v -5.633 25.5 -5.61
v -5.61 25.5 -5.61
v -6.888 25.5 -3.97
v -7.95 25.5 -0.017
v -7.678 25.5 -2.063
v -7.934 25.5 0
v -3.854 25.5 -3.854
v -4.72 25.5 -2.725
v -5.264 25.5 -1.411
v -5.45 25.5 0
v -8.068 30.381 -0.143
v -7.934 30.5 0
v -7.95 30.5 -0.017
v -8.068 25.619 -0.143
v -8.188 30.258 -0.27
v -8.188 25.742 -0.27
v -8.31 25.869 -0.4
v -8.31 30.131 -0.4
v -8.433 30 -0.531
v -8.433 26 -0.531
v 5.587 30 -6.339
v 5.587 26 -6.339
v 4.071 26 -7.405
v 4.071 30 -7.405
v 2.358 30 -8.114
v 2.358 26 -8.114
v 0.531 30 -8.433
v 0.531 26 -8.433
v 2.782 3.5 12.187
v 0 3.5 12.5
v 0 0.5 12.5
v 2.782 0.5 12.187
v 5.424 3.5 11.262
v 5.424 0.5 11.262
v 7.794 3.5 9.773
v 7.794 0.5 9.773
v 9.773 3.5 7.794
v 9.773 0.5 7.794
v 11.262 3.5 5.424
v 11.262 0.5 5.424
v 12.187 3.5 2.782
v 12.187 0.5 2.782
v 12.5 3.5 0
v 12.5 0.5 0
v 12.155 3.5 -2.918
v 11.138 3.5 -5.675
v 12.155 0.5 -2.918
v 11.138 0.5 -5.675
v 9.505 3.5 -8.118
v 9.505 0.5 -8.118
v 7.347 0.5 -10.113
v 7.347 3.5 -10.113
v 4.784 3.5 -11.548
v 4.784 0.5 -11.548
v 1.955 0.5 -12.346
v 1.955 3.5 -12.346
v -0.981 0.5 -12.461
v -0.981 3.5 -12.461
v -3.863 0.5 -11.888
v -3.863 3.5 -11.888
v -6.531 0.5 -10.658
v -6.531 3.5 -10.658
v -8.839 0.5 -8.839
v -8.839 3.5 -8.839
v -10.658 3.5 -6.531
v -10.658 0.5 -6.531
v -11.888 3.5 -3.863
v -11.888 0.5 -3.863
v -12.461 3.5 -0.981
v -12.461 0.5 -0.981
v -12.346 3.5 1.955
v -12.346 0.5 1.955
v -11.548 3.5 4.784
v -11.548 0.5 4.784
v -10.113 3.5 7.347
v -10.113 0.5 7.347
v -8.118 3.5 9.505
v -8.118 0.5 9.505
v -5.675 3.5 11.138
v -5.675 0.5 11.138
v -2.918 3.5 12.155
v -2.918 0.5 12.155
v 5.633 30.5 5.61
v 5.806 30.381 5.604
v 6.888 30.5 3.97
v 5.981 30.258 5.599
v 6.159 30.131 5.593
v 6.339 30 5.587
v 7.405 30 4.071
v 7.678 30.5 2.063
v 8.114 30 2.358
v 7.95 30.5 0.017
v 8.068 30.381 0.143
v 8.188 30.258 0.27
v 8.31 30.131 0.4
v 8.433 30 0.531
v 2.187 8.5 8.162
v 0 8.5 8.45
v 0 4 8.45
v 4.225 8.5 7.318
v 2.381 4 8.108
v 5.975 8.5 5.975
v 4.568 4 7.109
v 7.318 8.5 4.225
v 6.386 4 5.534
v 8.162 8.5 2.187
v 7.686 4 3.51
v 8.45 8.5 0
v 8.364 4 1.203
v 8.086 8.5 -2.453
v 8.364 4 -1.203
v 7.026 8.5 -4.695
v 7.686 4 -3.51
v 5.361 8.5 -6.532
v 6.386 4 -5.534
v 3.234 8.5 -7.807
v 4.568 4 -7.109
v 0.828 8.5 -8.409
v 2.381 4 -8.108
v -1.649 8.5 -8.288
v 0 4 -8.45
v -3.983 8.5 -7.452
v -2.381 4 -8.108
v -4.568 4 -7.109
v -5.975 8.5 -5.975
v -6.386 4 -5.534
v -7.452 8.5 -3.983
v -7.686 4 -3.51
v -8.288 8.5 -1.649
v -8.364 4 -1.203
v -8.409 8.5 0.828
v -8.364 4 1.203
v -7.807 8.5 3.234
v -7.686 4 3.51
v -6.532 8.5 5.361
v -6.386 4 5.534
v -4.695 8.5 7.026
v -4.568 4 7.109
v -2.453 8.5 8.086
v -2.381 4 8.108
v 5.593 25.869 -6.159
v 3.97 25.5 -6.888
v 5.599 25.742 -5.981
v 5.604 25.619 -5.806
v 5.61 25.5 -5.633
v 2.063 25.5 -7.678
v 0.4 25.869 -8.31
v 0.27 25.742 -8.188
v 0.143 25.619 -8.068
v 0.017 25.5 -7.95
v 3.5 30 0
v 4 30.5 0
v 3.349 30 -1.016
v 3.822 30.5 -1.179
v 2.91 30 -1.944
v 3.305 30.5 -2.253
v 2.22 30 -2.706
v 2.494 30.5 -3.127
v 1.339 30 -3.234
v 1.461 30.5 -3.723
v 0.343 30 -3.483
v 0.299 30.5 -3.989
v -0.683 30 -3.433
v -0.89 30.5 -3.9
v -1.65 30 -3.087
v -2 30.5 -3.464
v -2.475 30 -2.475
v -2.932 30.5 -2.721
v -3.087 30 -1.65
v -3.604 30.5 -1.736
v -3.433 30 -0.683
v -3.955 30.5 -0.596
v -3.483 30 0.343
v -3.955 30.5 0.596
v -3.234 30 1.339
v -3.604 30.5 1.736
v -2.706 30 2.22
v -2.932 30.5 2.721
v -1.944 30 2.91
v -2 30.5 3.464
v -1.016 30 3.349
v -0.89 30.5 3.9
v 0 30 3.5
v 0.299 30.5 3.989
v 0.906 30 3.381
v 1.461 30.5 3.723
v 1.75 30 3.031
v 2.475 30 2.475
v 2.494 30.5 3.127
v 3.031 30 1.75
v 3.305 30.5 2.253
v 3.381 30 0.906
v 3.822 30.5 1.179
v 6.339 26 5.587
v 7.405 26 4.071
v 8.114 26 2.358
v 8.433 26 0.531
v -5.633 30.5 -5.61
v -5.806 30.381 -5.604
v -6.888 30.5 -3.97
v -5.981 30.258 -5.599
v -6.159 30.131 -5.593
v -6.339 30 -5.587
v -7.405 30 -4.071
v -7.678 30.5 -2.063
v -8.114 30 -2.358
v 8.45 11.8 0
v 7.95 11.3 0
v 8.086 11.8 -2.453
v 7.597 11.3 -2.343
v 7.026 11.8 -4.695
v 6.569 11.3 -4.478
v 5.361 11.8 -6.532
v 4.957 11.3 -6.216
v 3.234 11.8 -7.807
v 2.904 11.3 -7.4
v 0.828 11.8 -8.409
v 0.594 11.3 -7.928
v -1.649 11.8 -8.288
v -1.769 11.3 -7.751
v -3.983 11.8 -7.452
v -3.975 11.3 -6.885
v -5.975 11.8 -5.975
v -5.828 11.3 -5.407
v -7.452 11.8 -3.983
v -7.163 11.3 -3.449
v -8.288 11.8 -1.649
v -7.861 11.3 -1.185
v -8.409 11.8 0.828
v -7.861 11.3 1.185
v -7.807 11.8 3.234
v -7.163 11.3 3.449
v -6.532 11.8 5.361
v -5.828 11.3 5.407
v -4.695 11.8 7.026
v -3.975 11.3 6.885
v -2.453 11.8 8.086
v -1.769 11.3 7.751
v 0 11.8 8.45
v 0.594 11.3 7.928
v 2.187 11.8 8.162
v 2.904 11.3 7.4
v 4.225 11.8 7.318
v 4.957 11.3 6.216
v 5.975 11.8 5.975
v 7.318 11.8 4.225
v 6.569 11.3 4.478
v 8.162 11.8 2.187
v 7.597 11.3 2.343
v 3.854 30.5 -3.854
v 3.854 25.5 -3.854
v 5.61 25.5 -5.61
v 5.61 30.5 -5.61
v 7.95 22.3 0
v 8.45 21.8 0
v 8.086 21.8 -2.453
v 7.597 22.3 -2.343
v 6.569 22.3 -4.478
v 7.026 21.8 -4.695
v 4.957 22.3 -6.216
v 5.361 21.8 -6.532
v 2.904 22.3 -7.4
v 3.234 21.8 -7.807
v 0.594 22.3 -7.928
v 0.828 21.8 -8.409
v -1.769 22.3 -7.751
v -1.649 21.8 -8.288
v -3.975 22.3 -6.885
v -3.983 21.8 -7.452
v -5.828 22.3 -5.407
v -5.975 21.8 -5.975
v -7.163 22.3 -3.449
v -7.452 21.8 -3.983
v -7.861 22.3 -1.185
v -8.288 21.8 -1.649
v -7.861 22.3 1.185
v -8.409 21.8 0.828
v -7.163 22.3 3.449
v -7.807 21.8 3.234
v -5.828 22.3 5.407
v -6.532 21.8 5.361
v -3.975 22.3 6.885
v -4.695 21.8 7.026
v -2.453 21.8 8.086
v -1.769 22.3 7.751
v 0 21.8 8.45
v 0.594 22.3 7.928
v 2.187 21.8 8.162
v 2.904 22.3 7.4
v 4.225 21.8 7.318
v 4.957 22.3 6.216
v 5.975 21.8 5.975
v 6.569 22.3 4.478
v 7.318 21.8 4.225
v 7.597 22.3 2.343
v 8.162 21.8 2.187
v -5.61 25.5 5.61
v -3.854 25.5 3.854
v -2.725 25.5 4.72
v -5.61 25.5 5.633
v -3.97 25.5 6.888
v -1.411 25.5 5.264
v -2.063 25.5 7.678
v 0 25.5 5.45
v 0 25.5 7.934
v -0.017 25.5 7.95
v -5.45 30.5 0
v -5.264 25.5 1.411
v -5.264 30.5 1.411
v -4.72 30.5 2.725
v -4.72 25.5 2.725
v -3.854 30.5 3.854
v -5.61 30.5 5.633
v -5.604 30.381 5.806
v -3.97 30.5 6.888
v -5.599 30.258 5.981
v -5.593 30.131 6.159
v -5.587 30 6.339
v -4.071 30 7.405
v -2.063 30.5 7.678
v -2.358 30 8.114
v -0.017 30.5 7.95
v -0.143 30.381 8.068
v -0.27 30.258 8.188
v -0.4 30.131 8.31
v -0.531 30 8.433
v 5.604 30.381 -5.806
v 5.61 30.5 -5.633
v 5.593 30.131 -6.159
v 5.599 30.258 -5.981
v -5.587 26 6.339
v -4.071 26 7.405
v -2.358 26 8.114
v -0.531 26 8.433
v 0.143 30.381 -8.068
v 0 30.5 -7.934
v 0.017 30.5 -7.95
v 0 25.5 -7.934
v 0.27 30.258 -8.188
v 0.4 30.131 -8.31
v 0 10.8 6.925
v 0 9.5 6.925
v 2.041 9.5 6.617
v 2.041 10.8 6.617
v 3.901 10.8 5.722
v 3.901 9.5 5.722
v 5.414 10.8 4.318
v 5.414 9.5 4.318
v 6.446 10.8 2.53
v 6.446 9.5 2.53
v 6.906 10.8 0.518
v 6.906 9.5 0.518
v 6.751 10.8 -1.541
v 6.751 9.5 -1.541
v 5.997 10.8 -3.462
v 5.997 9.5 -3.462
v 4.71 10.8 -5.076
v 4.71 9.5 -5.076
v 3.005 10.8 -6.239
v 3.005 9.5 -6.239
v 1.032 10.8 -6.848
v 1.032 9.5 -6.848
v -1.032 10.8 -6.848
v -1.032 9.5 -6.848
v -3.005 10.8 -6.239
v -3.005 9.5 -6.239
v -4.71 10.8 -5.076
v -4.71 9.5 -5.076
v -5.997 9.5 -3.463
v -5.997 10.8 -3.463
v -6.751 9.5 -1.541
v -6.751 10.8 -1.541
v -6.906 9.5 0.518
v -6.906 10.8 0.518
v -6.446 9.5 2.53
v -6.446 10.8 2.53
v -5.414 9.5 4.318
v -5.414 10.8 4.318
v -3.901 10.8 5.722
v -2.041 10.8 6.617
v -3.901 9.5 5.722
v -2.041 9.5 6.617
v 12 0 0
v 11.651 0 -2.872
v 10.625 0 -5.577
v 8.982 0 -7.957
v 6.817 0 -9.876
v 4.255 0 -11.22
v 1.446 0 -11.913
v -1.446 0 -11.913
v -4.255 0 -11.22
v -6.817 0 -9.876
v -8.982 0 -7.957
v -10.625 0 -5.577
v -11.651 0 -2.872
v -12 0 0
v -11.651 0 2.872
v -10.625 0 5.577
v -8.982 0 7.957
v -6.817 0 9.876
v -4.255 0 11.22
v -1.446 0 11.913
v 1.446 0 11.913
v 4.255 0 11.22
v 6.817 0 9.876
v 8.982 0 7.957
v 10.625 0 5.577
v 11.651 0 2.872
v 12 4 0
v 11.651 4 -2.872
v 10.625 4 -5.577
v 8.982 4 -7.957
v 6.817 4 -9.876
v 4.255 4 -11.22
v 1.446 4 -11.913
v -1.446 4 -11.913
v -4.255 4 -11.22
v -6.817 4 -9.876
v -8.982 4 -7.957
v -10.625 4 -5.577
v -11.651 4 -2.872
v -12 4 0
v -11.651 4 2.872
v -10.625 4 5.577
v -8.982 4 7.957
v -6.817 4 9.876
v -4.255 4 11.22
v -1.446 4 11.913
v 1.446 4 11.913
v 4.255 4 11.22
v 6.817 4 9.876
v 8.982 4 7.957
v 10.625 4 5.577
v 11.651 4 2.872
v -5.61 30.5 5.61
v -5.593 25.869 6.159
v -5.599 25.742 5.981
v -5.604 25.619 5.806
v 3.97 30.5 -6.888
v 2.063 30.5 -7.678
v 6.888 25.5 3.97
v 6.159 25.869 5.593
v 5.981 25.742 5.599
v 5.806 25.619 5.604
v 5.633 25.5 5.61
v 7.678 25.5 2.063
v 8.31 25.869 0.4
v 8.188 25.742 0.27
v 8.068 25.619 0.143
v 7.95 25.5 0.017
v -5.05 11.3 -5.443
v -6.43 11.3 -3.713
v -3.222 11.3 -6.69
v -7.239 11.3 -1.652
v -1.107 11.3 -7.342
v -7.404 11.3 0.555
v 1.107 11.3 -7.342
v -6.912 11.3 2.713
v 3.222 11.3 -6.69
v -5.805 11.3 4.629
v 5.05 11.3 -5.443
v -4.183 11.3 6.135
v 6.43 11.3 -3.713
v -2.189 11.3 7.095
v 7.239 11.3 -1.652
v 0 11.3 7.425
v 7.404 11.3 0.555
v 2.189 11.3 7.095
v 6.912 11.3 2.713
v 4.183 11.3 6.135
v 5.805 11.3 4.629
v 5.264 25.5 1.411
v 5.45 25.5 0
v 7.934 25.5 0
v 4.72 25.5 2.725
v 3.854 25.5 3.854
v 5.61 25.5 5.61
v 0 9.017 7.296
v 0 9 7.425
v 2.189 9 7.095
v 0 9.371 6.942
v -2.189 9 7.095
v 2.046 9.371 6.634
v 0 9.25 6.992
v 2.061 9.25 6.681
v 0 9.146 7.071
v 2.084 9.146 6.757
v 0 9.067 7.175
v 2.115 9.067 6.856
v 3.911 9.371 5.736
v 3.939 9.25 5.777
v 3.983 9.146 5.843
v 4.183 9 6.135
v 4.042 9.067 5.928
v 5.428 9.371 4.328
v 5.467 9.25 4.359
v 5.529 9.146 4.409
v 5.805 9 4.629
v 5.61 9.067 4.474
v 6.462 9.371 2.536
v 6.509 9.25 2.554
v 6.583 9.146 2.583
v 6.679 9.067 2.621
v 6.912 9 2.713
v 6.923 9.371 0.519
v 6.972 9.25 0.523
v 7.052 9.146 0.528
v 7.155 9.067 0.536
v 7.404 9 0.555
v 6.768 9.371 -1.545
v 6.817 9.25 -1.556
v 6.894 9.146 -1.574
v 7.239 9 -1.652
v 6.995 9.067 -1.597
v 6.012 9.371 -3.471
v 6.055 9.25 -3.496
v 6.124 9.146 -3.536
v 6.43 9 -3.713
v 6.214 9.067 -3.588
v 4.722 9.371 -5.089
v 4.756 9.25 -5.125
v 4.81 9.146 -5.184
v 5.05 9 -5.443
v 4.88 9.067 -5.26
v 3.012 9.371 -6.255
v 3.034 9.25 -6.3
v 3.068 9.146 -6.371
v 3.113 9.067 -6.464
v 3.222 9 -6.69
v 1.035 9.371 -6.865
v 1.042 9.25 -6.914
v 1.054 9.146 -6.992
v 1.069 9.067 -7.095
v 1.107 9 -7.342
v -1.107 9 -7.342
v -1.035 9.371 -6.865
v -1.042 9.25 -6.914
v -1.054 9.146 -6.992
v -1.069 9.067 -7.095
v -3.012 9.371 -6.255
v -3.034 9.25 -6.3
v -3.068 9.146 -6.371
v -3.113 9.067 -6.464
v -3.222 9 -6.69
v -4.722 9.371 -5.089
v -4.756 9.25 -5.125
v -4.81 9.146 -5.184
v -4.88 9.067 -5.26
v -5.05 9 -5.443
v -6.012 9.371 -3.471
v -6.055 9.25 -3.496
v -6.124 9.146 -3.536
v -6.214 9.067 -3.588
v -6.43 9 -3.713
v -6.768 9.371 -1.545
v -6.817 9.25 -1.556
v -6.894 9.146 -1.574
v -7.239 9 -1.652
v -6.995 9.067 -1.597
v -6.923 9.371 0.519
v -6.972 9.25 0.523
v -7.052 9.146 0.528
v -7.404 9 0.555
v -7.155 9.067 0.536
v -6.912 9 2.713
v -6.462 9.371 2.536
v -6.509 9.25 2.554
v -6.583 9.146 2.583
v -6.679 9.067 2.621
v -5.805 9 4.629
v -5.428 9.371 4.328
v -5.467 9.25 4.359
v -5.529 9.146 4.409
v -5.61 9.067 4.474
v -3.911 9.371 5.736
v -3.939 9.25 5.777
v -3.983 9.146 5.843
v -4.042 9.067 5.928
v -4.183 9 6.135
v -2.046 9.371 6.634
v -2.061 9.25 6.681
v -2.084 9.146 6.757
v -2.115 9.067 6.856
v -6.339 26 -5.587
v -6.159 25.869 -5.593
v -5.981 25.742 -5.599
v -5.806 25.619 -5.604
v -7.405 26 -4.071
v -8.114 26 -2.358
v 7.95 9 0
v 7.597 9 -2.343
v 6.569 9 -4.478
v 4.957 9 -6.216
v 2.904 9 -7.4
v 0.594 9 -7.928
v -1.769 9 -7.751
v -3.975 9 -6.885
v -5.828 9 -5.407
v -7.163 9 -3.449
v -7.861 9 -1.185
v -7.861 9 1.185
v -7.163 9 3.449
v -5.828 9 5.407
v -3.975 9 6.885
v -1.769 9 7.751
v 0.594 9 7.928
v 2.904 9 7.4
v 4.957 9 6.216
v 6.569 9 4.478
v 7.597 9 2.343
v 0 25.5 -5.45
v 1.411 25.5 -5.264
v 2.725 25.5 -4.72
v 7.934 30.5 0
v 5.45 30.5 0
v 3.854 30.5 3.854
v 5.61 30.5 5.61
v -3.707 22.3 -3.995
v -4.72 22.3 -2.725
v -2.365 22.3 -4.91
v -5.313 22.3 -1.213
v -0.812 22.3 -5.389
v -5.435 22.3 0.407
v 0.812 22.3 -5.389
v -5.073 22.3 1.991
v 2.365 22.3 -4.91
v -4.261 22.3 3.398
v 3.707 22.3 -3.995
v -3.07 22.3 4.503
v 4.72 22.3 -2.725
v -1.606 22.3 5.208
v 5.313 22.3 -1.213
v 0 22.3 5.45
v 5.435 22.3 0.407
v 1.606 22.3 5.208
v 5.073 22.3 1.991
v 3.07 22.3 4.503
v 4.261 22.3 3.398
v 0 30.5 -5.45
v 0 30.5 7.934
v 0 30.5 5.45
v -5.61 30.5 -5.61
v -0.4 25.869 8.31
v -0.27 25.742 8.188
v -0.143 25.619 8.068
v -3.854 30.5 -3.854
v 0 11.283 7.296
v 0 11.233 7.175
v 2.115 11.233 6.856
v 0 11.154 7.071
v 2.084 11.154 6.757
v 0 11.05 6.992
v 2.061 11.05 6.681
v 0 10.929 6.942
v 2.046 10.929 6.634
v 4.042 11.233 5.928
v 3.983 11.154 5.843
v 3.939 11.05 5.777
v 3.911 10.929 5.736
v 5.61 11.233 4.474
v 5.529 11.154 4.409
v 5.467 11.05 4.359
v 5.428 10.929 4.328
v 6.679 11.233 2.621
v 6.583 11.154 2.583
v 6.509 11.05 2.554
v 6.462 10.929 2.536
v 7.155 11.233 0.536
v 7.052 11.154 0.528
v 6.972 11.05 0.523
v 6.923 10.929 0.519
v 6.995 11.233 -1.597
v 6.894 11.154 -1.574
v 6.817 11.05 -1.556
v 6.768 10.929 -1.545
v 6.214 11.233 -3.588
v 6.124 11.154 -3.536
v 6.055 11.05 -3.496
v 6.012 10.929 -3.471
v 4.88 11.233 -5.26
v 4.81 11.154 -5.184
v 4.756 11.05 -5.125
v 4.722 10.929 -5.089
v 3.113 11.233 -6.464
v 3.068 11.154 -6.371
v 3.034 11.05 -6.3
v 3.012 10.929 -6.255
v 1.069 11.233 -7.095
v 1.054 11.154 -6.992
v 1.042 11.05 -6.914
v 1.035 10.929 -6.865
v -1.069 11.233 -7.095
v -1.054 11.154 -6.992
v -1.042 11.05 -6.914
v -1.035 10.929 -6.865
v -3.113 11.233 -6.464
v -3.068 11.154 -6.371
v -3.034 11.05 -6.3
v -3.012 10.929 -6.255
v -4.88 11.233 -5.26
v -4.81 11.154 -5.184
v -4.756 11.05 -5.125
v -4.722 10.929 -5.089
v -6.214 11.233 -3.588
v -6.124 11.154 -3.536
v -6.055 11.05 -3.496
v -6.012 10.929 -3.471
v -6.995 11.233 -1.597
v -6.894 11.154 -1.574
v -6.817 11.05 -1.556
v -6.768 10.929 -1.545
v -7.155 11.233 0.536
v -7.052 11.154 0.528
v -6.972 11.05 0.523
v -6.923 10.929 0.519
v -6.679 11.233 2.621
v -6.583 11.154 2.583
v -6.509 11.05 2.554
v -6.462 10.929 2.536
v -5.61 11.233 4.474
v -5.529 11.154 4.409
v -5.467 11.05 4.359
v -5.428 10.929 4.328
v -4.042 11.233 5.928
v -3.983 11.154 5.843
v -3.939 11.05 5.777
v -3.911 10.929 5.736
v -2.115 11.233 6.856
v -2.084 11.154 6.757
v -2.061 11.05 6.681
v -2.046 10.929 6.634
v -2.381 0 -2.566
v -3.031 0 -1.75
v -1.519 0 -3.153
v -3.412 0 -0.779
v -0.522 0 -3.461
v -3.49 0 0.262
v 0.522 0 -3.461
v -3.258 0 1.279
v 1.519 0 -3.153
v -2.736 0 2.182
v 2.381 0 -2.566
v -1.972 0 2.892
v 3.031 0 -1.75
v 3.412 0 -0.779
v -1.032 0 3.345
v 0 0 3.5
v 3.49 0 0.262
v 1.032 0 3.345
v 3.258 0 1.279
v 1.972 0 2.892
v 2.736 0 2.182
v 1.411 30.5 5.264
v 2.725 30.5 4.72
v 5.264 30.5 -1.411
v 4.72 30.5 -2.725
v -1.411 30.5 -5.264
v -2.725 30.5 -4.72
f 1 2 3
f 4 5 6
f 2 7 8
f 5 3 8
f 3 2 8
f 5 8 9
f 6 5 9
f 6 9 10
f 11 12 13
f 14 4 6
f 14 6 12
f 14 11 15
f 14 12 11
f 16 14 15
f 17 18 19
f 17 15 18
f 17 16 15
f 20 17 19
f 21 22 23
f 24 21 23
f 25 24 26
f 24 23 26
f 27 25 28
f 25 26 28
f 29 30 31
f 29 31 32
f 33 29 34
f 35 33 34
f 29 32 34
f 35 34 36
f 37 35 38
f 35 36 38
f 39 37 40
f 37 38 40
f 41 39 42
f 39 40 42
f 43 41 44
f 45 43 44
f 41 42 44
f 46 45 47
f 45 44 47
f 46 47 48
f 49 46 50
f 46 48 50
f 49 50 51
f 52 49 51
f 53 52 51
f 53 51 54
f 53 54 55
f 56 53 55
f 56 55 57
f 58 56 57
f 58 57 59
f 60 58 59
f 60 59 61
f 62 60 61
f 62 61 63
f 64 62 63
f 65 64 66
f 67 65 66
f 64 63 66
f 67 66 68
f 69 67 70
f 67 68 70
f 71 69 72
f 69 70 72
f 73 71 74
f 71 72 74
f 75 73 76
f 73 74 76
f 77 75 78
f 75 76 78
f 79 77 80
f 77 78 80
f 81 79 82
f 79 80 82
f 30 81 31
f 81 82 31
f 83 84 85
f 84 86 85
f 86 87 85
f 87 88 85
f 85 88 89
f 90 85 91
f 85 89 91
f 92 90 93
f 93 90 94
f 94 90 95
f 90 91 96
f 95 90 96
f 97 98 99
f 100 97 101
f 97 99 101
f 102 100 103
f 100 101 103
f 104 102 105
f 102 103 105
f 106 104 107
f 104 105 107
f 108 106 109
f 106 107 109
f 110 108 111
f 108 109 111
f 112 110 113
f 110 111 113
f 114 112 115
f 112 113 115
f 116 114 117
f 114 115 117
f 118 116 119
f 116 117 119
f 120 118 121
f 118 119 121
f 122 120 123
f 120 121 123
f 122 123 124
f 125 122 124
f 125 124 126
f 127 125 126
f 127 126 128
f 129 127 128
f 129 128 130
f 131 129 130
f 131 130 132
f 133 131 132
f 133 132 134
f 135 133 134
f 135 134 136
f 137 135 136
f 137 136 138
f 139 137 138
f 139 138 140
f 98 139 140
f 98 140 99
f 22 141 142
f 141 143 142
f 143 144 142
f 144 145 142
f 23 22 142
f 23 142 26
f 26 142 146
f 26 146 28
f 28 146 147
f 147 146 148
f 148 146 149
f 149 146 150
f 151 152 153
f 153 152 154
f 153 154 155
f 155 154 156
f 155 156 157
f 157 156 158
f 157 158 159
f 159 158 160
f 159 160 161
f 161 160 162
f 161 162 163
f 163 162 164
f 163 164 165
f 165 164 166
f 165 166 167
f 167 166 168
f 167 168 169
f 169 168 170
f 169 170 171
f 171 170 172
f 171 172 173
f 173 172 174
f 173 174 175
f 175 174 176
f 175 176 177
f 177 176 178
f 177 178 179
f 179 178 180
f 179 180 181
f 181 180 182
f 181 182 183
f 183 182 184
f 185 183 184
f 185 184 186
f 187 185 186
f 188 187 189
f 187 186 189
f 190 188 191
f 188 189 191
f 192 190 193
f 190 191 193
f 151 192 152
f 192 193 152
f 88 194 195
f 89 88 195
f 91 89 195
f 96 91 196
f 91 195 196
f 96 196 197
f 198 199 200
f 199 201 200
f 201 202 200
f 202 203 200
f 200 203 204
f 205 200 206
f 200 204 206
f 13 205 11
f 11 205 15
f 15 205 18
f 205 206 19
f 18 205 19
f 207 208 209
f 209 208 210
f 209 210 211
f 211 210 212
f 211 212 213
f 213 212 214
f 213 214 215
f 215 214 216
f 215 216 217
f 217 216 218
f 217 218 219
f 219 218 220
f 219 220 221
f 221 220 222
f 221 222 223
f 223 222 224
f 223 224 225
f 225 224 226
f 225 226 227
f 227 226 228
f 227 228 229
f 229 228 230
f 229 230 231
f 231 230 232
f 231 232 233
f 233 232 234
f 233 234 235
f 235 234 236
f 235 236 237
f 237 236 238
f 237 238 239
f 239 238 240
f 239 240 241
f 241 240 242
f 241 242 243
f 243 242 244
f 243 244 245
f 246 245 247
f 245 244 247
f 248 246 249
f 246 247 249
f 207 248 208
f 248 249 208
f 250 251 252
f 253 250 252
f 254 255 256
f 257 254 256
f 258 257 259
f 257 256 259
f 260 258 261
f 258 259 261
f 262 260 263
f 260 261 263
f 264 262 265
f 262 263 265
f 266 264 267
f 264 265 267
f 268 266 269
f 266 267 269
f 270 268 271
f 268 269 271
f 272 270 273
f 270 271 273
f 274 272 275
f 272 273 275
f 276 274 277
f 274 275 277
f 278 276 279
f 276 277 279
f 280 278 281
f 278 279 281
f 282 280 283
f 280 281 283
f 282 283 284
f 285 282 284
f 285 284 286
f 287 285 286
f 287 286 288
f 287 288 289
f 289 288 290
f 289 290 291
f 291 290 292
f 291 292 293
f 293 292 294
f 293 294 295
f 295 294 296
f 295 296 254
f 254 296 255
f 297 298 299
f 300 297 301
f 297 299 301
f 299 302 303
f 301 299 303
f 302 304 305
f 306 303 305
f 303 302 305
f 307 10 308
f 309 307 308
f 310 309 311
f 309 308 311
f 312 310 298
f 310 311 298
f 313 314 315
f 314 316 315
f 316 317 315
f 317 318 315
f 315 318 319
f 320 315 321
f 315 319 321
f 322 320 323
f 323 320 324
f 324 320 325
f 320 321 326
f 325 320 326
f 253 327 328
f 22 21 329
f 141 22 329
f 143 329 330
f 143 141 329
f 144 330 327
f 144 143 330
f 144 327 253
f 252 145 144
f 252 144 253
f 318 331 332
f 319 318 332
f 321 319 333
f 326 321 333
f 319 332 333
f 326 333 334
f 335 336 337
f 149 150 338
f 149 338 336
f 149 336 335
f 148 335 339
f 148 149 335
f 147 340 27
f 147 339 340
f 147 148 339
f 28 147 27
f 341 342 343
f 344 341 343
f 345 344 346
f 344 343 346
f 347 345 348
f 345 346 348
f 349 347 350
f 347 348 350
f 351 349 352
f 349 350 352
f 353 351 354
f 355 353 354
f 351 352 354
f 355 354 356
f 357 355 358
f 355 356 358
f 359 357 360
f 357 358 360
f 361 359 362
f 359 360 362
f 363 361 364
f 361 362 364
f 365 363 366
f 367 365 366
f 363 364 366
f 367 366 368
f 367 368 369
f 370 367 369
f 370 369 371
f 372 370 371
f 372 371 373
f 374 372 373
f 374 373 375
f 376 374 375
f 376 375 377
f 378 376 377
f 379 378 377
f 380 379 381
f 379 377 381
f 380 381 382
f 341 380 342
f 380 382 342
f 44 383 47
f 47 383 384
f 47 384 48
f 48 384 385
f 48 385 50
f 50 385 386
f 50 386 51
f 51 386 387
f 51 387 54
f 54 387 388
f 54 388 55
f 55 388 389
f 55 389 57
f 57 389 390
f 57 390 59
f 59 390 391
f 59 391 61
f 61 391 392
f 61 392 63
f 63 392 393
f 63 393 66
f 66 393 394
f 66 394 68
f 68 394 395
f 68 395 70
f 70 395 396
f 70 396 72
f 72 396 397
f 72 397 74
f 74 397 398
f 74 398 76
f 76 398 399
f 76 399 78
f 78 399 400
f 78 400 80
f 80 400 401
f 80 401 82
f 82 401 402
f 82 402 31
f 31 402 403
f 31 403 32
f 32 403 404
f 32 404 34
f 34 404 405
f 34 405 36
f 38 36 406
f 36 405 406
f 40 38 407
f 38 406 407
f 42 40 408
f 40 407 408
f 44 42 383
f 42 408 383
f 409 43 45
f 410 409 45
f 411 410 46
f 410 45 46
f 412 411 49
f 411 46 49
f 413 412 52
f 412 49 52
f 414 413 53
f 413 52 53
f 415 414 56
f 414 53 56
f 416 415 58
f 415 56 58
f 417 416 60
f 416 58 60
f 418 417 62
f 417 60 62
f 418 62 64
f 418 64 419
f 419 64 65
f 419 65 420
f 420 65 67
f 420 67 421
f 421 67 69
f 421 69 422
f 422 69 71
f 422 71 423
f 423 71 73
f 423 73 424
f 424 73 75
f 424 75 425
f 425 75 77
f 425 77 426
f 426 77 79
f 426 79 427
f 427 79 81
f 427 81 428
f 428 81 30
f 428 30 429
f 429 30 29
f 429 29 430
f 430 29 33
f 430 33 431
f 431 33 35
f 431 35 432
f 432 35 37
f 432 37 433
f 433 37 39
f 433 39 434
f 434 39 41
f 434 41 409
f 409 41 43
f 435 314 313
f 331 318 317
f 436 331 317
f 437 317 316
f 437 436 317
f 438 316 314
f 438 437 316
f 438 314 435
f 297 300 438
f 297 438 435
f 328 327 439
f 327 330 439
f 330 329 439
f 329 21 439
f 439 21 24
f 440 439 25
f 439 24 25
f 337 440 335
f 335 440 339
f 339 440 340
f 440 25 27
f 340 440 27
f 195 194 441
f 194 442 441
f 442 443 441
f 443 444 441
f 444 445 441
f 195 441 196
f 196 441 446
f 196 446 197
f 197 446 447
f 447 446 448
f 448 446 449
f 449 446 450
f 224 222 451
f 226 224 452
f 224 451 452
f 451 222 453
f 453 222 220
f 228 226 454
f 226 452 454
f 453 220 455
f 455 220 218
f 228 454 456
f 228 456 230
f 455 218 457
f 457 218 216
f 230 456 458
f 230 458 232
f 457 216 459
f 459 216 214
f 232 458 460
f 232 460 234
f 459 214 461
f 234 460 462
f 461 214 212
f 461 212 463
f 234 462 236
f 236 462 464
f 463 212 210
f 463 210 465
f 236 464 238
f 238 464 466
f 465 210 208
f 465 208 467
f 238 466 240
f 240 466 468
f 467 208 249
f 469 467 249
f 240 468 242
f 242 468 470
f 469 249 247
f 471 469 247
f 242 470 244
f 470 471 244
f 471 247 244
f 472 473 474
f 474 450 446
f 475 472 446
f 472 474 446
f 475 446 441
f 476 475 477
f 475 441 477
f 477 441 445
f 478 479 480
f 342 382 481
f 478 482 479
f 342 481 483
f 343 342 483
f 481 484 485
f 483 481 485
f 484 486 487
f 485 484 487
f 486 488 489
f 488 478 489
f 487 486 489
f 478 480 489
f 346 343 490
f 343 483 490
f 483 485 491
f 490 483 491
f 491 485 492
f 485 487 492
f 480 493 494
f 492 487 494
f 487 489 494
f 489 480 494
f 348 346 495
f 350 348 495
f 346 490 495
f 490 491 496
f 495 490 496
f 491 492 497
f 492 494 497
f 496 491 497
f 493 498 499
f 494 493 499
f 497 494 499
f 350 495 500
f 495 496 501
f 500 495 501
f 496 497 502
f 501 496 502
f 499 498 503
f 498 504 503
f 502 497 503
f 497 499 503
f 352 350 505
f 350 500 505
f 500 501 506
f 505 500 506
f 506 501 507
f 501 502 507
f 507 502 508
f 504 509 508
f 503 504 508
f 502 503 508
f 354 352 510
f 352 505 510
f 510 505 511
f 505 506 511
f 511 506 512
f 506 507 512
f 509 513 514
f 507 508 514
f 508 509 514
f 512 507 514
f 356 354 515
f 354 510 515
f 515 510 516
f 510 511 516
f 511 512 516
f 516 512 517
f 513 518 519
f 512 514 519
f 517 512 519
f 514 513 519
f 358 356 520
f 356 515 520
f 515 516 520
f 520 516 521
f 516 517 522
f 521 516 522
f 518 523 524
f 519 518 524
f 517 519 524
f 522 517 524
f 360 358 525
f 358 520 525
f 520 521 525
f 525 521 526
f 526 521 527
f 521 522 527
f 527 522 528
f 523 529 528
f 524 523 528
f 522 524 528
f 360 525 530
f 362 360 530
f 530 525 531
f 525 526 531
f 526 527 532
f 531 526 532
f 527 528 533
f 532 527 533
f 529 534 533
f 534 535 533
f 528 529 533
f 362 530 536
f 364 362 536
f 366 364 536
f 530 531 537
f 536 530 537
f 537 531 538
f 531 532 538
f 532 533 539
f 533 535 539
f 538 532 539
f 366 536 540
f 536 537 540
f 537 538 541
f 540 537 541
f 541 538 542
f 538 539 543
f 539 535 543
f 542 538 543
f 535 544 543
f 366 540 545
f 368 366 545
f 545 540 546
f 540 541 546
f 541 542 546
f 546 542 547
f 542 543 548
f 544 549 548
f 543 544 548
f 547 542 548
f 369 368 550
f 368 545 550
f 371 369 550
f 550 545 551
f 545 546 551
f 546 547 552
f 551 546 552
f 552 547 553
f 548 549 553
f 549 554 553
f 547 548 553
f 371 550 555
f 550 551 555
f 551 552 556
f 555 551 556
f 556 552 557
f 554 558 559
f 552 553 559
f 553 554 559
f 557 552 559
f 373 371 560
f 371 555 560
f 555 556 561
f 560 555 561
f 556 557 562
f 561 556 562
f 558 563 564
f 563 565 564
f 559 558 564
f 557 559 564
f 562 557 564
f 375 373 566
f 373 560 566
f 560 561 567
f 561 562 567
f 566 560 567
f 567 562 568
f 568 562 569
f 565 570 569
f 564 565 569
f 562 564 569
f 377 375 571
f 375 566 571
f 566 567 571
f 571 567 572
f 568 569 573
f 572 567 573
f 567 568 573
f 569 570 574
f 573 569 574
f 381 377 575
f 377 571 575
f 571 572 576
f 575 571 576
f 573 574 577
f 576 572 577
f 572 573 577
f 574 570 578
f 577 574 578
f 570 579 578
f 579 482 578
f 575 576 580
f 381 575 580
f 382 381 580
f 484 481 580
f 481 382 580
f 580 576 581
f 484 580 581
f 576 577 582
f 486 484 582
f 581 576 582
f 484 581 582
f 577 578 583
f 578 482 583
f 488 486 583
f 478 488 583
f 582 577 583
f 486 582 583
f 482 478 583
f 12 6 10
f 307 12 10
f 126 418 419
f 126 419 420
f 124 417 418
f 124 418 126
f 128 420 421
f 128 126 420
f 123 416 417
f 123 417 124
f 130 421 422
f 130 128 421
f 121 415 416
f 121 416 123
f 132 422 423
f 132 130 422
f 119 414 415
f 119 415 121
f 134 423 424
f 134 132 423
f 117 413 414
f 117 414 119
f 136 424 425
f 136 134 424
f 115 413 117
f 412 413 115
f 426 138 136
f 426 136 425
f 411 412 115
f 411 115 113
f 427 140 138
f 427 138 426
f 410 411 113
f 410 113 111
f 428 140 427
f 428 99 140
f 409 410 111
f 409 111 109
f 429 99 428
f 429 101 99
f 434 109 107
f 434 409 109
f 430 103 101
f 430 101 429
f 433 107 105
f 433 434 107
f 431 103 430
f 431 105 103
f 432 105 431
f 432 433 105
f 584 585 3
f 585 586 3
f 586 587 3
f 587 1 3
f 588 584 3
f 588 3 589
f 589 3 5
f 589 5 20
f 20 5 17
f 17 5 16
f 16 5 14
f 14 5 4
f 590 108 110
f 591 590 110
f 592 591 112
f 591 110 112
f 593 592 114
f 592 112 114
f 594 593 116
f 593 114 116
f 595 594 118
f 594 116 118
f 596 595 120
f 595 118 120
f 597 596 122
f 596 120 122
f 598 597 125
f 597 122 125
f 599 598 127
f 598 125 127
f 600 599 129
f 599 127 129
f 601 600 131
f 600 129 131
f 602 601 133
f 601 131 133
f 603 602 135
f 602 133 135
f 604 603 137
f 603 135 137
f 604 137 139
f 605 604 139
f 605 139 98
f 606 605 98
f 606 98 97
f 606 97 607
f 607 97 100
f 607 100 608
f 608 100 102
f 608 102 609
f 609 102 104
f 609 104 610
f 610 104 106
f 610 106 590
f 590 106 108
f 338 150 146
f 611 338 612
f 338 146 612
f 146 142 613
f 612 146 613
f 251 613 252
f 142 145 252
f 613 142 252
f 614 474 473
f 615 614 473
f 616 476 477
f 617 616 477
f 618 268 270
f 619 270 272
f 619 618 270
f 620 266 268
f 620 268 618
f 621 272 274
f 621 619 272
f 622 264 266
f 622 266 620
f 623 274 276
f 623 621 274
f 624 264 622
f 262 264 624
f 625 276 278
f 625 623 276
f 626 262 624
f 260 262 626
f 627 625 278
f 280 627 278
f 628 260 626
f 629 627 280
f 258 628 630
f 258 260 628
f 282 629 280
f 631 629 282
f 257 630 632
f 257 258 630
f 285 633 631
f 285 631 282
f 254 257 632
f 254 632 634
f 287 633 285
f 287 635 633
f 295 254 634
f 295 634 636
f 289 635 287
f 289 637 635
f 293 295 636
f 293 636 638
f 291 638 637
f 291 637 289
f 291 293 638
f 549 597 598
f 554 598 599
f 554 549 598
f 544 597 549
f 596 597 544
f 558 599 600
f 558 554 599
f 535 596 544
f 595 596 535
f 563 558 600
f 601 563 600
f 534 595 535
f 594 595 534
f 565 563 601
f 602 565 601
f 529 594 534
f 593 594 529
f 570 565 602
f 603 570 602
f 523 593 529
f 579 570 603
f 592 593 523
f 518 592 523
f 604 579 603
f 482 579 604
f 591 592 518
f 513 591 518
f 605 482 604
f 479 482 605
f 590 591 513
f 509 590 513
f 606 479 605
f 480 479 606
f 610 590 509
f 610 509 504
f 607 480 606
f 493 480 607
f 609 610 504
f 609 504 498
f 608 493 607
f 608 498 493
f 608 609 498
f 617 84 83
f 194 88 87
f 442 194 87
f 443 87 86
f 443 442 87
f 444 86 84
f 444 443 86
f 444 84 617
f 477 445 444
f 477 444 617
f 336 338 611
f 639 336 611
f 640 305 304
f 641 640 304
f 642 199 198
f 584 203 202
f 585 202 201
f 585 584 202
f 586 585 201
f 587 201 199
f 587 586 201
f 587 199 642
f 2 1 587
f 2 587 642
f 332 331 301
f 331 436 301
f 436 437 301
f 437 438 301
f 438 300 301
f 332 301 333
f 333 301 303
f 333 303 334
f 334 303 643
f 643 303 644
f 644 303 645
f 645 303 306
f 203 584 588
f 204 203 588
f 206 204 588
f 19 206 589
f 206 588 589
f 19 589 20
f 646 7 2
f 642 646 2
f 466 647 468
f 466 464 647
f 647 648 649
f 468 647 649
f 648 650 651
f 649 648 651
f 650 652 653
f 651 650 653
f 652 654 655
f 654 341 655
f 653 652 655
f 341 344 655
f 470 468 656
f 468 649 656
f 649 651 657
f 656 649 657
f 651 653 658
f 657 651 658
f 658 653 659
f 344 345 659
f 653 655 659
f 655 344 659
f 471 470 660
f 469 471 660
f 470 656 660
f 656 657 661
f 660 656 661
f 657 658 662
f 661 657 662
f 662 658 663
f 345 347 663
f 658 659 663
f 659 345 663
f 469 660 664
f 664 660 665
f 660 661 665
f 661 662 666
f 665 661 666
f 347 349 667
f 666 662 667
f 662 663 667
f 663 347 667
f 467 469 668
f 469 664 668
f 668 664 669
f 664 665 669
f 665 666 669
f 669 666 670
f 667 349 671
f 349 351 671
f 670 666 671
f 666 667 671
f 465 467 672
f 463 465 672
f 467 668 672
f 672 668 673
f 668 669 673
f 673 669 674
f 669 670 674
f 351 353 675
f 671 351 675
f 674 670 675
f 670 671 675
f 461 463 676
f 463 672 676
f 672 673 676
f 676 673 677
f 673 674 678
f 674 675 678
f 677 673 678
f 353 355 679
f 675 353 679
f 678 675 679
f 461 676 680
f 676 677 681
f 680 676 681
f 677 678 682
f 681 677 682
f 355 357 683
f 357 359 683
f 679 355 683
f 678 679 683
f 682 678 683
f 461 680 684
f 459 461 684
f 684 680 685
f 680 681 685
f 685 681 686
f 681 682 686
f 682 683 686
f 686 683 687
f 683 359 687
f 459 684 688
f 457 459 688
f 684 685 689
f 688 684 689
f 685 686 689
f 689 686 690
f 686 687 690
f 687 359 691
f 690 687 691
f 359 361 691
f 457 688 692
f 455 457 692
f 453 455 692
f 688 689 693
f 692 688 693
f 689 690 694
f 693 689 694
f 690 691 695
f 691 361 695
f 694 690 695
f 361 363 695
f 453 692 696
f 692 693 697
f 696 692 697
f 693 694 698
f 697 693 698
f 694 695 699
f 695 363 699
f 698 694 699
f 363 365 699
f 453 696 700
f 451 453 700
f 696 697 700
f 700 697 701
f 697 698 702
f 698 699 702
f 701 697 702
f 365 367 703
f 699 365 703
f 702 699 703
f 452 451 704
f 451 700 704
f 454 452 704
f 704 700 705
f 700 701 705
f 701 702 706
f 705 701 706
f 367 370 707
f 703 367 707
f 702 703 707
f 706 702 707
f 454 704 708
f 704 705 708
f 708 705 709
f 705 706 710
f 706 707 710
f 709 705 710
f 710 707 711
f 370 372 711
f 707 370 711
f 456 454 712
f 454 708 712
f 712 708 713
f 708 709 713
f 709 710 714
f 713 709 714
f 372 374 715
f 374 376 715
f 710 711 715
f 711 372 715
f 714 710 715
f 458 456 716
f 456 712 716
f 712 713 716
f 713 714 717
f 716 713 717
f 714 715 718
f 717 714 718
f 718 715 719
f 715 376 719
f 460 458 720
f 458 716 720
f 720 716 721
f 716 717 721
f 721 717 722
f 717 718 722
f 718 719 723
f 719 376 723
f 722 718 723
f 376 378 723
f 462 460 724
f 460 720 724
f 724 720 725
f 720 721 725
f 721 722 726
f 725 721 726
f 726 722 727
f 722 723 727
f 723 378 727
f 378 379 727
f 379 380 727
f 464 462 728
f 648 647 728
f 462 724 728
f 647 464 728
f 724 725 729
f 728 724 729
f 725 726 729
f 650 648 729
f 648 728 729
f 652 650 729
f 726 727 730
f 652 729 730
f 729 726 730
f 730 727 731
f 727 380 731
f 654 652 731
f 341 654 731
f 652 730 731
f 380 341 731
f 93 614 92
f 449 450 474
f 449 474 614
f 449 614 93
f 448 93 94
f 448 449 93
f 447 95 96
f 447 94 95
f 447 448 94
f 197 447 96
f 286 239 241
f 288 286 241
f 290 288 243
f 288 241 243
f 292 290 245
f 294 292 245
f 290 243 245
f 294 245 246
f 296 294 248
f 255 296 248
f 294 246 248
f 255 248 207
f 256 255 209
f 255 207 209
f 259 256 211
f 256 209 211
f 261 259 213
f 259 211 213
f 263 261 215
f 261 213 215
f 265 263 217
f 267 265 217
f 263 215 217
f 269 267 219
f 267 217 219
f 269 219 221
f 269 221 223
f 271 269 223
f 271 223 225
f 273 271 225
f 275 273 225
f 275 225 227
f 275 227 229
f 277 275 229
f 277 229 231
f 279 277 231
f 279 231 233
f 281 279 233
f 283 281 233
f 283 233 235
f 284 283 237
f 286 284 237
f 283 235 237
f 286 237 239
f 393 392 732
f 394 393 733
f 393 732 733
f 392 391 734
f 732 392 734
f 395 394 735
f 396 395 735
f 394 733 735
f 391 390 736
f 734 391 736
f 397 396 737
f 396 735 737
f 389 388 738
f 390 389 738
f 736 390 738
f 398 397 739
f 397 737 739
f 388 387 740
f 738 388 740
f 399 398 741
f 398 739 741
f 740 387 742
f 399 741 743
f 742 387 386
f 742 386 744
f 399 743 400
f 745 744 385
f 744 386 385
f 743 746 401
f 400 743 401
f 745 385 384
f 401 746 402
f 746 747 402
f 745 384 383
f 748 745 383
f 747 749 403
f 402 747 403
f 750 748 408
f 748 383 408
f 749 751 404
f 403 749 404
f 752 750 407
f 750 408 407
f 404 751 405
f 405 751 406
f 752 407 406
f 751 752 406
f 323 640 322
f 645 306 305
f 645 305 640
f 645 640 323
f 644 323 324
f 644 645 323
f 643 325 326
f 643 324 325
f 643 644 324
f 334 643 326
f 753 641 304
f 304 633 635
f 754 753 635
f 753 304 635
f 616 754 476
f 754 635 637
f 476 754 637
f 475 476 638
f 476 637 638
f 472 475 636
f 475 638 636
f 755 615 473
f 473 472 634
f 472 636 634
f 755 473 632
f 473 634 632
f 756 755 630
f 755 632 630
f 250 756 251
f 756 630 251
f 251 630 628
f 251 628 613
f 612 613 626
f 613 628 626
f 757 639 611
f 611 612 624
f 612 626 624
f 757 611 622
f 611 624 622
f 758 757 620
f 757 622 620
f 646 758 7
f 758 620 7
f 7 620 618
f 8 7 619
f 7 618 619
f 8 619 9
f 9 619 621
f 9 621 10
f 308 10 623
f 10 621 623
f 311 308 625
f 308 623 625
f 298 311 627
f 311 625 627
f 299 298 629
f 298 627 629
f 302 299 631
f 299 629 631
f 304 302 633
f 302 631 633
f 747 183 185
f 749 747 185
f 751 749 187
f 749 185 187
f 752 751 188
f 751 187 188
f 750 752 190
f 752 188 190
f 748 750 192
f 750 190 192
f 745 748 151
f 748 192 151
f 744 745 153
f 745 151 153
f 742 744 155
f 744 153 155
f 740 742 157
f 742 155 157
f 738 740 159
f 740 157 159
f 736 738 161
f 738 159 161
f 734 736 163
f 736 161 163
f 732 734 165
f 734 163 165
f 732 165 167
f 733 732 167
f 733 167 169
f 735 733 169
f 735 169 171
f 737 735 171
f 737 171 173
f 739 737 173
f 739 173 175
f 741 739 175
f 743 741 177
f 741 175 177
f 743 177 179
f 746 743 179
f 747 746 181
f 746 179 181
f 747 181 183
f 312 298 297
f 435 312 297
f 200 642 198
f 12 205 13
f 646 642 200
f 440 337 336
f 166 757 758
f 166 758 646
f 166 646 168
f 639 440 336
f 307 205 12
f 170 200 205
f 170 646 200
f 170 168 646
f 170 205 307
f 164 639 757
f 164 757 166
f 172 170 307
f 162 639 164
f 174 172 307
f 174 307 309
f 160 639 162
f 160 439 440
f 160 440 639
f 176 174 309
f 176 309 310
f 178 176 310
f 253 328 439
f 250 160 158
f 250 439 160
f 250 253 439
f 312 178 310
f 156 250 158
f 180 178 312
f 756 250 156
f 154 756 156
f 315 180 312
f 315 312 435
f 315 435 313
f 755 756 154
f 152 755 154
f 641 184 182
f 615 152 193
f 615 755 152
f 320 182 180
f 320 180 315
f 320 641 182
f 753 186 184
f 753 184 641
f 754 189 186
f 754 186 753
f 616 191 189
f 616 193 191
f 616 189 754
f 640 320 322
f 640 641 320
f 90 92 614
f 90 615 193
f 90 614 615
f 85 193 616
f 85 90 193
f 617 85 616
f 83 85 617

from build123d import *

# Parameters (mm, degrees)
SKETCH1_R           = 12.5
BOSS_EXTRUDE1_DEPTH = 4
SKETCH2_R           = 8.45
BOSS_EXTRUDE2_DEPTH = 5
SKETCH3_R           = 6.925
BOSS_EXTRUDE3_DEPTH = 2.3
SKETCH4_R           = 8.45
BOSS_EXTRUDE4_DEPTH = 11
SKETCH5_R           = 5.45
BOSS_EXTRUDE5_DEPTH = 3.2
SKETCH6_R           = 5.45
BOSS_EXTRUDE7_DEPTH = 5
SKETCH7_R           = 3.5
CUT_EXTRUDE1_DEPTH  = 36.252659474
CHAMFER1_START      = 25.5
CHAMFER1_2_DEPTH    = 5.5
FILLET1_R           = 0.5


with BuildPart() as part:
    # Sketch1 → Boss-Extrude1 (new body)
    with BuildSketch(Plane(origin=(0, 0, 0), x_dir=(1, 0, 0), z_dir=(0, 1, 0))):
        with Locations(Location((0, 0, 0), (0, 0, 270))):
            Circle(SKETCH1_R)
    extrude(amount=BOSS_EXTRUDE1_DEPTH)

    # Sketch2 → Boss-Extrude2 (add)
    with BuildSketch(Plane(origin=(0, 4, 0), x_dir=(1, 0, 0), z_dir=(0, 1, 0))):
        with Locations(Location((0, 0, 0), (0, 0, 270))):
            Circle(SKETCH2_R)
    extrude(amount=BOSS_EXTRUDE2_DEPTH)

    # Sketch3 → Boss-Extrude3 (add)
    with BuildSketch(Plane(origin=(0, 9, 0), x_dir=(1, 0, 0), z_dir=(0, 1, 0))):
        with Locations(Location((0, 0, 0), (0, 0, 270))):
            Circle(SKETCH3_R)
    extrude(amount=BOSS_EXTRUDE3_DEPTH)

    # Sketch4 → Boss-Extrude4 (add)
    with BuildSketch(Plane(origin=(0, 11.3, 0), x_dir=(1, 0, 0), z_dir=(0, 1, 0))):
        with Locations(Location((0, 0, 0), (0, 0, 270))):
            Circle(SKETCH4_R)
    extrude(amount=BOSS_EXTRUDE4_DEPTH)

    # Sketch5 → Boss-Extrude5 (add)
    with BuildSketch(Plane(origin=(0, 22.3, 0), x_dir=(1, 0, 0), z_dir=(0, 1, 0))):
        with Locations(Location((0, 0, 0), (0, 0, 270))):
            Circle(SKETCH5_R)
    extrude(amount=BOSS_EXTRUDE5_DEPTH)

    # Sketch6 → Boss-Extrude7 (add)
    with BuildSketch(Plane(origin=(0, 25.5, 0), x_dir=(1, 0, 0), z_dir=(0, 1, 0))):
        with Locations(Location((0, 0, 0), (0, 0, 270))):
            Circle(SKETCH6_R)
        with BuildLine():
            Line((-8.45, 0), (-5.45, 0))
            ThreePointArc((-5.45, 0), (-5.035143452, 2.085624706), (-3.853731957, 3.853731957))
            Line((-3.853731957, 3.853731957), (-5.975052301, 5.975052301))
            ThreePointArc((-5.975052301, 5.975052301), (-7.80678205, 3.233675003), (-8.45, 0))
        make_face()
        with BuildLine():
            ThreePointArc((0, -5.45), (-2.085624706, -5.035143452), (-3.853731957, -3.853731957))
            Line((-3.853731957, -3.853731957), (-5.975052301, -5.975052301))
            ThreePointArc((-5.975052301, -5.975052301), (-3.233675003, -7.80678205), (0, -8.45))
            Line((0, -8.45), (0, -5.45))
        make_face()
        with BuildLine():
            ThreePointArc((5.45, 0), (5.035143452, -2.085624706), (3.853731957, -3.853731957))
            Line((3.853731957, -3.853731957), (5.975052301, -5.975052301))
            ThreePointArc((5.975052301, -5.975052301), (7.80678205, -3.233675003), (8.45, 0))
            Line((8.45, 0), (5.45, 0))
        make_face()
        with BuildLine():
            Line((0, 8.45), (0, 5.45))
            ThreePointArc((0, 5.45), (2.085624706, 5.035143452), (3.853731957, 3.853731957))
            Line((3.853731957, 3.853731957), (5.975052301, 5.975052301))
            ThreePointArc((5.975052301, 5.975052301), (3.233675003, 7.80678205), (0, 8.45))
        make_face()
    extrude(amount=BOSS_EXTRUDE7_DEPTH)

    # Sketch7 → Cut-Extrude1 (cut, through all)
    with BuildSketch(Plane(origin=(0, 30.5, 0), x_dir=(1, 0, 0), z_dir=(0, 1, 0))):
        with Locations(Location((0, 0, 0), (0, 0, 270))):
            Circle(SKETCH7_R)
    extrude(amount=-CUT_EXTRUDE1_DEPTH, mode=Mode.SUBTRACT)

    # Chamfer1: read off the stored shape, not the designer's step
    # Chamfer1 outline → Chamfer1 (revolve, cut)
    with BuildSketch(Plane.XY):
        Polygon((12.5, 0.5), (12, 0), (12.5, 0), align=None)
        Polygon((12, 4), (12.5, 3.5), (12.5, 4), align=None)
        Polygon((7.95, 9), (8.45, 8.5), (8.45, 9), align=None)
        Polygon((7.95, 11.3), (8.45, 11.3), (8.45, 11.8), align=None)
        Polygon((7.95, 22.3), (8.45, 21.8), (8.45, 22.3), align=None)
        Polygon((7.95, 30.5), (8.45, 30), (8.45, 30.5), align=None)
        Polygon((3.5, 30), (4, 30.5), (3.5, 30.5), align=None)
    revolve(axis=Axis((0, 0, 0), (0, 1, 0)), mode=Mode.SUBTRACT)

    # Chamfer1 2 outline → Chamfer1 2 (cut)
    with BuildSketch(Plane(origin=(0, 0, 0), x_dir=(1, 0, 0), z_dir=(0, 1, 0)).offset(CHAMFER1_START)):
        with BuildLine():
            Line((8.45, 0), (7.93426115, 0))
            Line((7.93426115, 0), (8.433271285, -0.531446541))
            ThreePointArc((8.433271285, -0.531446541), (8.445816786, -0.265854883), (8.45, 0))
        make_face()
        with BuildLine():
            ThreePointArc((5.975052301, -5.975052301), (6.160082112, -5.784106531), (6.339012766, -5.587433861))
            Line((6.339012766, -5.587433861), (5.610369863, -5.610369863))
            Line((5.610369863, -5.610369863), (5.975052301, -5.975052301))
        make_face()
        with BuildLine():
            ThreePointArc((5.975052301, 5.975052301), (5.784106531, 6.160082112), (5.587433861, 6.339012766))
            Line((5.587433861, 6.339012766), (5.610369863, 5.610369863))
            Line((5.610369863, 5.610369863), (5.975052301, 5.975052301))
        make_face()
        with BuildLine():
            Line((0, 7.93426115), (0.531446541, 8.433271285))
            ThreePointArc((0.531446541, 8.433271285), (0.265854883, 8.445816786), (0, 8.45))
            Line((0, 8.45), (0, 7.93426115))
        make_face()
        with BuildLine():
            ThreePointArc((-5.975052301, -5.975052301), (-5.784106531, -6.160082112), (-5.587433861, -6.339012766))
            Line((-5.587433861, -6.339012766), (-5.610369863, -5.610369863))
            Line((-5.610369863, -5.610369863), (-5.975052301, -5.975052301))
        make_face()
        with BuildLine():
            Line((0, -7.93426115), (-0.531446541, -8.433271285))
            ThreePointArc((-0.531446541, -8.433271285), (-0.265854883, -8.445816786), (0, -8.45))
            Line((0, -8.45), (0, -7.93426115))
        make_face()
        with BuildLine():
            ThreePointArc((-5.975052301, 5.975052301), (-6.160082112, 5.784106531), (-6.339012766, 5.587433861))
            Line((-6.339012766, 5.587433861), (-5.610369863, 5.610369863))
            Line((-5.610369863, 5.610369863), (-5.975052301, 5.975052301))
        make_face()
        with BuildLine():
            Line((-7.93426115, 0), (-8.433271285, 0.531446541))
            ThreePointArc((-8.433271285, 0.531446541), (-8.445816786, 0.265854883), (-8.45, 0))
            Line((-8.45, 0), (-7.93426115, 0))
        make_face()
    extrude(amount=CHAMFER1_2_DEPTH, mode=Mode.SUBTRACT)

    # Chamfer1 3 outline → Chamfer1 3 (revolve, cut)
    with BuildSketch(Plane.XY):
        Polygon((8.45, 26), (7.95, 25.5), (8.45, 25.5), align=None)
    revolve(axis=Axis((0, 0, 0), (0, 1, 0)), mode=Mode.SUBTRACT)

    # Fillet1
    fillet1_edges = [part.edges().sort_by_distance(p)[0] for p in [
        (0, 11.3, -6.925),
        (0, 9, -6.925),
    ]]
    fillet(fillet1_edges, radius=FILLET1_R)


solid = part.part
